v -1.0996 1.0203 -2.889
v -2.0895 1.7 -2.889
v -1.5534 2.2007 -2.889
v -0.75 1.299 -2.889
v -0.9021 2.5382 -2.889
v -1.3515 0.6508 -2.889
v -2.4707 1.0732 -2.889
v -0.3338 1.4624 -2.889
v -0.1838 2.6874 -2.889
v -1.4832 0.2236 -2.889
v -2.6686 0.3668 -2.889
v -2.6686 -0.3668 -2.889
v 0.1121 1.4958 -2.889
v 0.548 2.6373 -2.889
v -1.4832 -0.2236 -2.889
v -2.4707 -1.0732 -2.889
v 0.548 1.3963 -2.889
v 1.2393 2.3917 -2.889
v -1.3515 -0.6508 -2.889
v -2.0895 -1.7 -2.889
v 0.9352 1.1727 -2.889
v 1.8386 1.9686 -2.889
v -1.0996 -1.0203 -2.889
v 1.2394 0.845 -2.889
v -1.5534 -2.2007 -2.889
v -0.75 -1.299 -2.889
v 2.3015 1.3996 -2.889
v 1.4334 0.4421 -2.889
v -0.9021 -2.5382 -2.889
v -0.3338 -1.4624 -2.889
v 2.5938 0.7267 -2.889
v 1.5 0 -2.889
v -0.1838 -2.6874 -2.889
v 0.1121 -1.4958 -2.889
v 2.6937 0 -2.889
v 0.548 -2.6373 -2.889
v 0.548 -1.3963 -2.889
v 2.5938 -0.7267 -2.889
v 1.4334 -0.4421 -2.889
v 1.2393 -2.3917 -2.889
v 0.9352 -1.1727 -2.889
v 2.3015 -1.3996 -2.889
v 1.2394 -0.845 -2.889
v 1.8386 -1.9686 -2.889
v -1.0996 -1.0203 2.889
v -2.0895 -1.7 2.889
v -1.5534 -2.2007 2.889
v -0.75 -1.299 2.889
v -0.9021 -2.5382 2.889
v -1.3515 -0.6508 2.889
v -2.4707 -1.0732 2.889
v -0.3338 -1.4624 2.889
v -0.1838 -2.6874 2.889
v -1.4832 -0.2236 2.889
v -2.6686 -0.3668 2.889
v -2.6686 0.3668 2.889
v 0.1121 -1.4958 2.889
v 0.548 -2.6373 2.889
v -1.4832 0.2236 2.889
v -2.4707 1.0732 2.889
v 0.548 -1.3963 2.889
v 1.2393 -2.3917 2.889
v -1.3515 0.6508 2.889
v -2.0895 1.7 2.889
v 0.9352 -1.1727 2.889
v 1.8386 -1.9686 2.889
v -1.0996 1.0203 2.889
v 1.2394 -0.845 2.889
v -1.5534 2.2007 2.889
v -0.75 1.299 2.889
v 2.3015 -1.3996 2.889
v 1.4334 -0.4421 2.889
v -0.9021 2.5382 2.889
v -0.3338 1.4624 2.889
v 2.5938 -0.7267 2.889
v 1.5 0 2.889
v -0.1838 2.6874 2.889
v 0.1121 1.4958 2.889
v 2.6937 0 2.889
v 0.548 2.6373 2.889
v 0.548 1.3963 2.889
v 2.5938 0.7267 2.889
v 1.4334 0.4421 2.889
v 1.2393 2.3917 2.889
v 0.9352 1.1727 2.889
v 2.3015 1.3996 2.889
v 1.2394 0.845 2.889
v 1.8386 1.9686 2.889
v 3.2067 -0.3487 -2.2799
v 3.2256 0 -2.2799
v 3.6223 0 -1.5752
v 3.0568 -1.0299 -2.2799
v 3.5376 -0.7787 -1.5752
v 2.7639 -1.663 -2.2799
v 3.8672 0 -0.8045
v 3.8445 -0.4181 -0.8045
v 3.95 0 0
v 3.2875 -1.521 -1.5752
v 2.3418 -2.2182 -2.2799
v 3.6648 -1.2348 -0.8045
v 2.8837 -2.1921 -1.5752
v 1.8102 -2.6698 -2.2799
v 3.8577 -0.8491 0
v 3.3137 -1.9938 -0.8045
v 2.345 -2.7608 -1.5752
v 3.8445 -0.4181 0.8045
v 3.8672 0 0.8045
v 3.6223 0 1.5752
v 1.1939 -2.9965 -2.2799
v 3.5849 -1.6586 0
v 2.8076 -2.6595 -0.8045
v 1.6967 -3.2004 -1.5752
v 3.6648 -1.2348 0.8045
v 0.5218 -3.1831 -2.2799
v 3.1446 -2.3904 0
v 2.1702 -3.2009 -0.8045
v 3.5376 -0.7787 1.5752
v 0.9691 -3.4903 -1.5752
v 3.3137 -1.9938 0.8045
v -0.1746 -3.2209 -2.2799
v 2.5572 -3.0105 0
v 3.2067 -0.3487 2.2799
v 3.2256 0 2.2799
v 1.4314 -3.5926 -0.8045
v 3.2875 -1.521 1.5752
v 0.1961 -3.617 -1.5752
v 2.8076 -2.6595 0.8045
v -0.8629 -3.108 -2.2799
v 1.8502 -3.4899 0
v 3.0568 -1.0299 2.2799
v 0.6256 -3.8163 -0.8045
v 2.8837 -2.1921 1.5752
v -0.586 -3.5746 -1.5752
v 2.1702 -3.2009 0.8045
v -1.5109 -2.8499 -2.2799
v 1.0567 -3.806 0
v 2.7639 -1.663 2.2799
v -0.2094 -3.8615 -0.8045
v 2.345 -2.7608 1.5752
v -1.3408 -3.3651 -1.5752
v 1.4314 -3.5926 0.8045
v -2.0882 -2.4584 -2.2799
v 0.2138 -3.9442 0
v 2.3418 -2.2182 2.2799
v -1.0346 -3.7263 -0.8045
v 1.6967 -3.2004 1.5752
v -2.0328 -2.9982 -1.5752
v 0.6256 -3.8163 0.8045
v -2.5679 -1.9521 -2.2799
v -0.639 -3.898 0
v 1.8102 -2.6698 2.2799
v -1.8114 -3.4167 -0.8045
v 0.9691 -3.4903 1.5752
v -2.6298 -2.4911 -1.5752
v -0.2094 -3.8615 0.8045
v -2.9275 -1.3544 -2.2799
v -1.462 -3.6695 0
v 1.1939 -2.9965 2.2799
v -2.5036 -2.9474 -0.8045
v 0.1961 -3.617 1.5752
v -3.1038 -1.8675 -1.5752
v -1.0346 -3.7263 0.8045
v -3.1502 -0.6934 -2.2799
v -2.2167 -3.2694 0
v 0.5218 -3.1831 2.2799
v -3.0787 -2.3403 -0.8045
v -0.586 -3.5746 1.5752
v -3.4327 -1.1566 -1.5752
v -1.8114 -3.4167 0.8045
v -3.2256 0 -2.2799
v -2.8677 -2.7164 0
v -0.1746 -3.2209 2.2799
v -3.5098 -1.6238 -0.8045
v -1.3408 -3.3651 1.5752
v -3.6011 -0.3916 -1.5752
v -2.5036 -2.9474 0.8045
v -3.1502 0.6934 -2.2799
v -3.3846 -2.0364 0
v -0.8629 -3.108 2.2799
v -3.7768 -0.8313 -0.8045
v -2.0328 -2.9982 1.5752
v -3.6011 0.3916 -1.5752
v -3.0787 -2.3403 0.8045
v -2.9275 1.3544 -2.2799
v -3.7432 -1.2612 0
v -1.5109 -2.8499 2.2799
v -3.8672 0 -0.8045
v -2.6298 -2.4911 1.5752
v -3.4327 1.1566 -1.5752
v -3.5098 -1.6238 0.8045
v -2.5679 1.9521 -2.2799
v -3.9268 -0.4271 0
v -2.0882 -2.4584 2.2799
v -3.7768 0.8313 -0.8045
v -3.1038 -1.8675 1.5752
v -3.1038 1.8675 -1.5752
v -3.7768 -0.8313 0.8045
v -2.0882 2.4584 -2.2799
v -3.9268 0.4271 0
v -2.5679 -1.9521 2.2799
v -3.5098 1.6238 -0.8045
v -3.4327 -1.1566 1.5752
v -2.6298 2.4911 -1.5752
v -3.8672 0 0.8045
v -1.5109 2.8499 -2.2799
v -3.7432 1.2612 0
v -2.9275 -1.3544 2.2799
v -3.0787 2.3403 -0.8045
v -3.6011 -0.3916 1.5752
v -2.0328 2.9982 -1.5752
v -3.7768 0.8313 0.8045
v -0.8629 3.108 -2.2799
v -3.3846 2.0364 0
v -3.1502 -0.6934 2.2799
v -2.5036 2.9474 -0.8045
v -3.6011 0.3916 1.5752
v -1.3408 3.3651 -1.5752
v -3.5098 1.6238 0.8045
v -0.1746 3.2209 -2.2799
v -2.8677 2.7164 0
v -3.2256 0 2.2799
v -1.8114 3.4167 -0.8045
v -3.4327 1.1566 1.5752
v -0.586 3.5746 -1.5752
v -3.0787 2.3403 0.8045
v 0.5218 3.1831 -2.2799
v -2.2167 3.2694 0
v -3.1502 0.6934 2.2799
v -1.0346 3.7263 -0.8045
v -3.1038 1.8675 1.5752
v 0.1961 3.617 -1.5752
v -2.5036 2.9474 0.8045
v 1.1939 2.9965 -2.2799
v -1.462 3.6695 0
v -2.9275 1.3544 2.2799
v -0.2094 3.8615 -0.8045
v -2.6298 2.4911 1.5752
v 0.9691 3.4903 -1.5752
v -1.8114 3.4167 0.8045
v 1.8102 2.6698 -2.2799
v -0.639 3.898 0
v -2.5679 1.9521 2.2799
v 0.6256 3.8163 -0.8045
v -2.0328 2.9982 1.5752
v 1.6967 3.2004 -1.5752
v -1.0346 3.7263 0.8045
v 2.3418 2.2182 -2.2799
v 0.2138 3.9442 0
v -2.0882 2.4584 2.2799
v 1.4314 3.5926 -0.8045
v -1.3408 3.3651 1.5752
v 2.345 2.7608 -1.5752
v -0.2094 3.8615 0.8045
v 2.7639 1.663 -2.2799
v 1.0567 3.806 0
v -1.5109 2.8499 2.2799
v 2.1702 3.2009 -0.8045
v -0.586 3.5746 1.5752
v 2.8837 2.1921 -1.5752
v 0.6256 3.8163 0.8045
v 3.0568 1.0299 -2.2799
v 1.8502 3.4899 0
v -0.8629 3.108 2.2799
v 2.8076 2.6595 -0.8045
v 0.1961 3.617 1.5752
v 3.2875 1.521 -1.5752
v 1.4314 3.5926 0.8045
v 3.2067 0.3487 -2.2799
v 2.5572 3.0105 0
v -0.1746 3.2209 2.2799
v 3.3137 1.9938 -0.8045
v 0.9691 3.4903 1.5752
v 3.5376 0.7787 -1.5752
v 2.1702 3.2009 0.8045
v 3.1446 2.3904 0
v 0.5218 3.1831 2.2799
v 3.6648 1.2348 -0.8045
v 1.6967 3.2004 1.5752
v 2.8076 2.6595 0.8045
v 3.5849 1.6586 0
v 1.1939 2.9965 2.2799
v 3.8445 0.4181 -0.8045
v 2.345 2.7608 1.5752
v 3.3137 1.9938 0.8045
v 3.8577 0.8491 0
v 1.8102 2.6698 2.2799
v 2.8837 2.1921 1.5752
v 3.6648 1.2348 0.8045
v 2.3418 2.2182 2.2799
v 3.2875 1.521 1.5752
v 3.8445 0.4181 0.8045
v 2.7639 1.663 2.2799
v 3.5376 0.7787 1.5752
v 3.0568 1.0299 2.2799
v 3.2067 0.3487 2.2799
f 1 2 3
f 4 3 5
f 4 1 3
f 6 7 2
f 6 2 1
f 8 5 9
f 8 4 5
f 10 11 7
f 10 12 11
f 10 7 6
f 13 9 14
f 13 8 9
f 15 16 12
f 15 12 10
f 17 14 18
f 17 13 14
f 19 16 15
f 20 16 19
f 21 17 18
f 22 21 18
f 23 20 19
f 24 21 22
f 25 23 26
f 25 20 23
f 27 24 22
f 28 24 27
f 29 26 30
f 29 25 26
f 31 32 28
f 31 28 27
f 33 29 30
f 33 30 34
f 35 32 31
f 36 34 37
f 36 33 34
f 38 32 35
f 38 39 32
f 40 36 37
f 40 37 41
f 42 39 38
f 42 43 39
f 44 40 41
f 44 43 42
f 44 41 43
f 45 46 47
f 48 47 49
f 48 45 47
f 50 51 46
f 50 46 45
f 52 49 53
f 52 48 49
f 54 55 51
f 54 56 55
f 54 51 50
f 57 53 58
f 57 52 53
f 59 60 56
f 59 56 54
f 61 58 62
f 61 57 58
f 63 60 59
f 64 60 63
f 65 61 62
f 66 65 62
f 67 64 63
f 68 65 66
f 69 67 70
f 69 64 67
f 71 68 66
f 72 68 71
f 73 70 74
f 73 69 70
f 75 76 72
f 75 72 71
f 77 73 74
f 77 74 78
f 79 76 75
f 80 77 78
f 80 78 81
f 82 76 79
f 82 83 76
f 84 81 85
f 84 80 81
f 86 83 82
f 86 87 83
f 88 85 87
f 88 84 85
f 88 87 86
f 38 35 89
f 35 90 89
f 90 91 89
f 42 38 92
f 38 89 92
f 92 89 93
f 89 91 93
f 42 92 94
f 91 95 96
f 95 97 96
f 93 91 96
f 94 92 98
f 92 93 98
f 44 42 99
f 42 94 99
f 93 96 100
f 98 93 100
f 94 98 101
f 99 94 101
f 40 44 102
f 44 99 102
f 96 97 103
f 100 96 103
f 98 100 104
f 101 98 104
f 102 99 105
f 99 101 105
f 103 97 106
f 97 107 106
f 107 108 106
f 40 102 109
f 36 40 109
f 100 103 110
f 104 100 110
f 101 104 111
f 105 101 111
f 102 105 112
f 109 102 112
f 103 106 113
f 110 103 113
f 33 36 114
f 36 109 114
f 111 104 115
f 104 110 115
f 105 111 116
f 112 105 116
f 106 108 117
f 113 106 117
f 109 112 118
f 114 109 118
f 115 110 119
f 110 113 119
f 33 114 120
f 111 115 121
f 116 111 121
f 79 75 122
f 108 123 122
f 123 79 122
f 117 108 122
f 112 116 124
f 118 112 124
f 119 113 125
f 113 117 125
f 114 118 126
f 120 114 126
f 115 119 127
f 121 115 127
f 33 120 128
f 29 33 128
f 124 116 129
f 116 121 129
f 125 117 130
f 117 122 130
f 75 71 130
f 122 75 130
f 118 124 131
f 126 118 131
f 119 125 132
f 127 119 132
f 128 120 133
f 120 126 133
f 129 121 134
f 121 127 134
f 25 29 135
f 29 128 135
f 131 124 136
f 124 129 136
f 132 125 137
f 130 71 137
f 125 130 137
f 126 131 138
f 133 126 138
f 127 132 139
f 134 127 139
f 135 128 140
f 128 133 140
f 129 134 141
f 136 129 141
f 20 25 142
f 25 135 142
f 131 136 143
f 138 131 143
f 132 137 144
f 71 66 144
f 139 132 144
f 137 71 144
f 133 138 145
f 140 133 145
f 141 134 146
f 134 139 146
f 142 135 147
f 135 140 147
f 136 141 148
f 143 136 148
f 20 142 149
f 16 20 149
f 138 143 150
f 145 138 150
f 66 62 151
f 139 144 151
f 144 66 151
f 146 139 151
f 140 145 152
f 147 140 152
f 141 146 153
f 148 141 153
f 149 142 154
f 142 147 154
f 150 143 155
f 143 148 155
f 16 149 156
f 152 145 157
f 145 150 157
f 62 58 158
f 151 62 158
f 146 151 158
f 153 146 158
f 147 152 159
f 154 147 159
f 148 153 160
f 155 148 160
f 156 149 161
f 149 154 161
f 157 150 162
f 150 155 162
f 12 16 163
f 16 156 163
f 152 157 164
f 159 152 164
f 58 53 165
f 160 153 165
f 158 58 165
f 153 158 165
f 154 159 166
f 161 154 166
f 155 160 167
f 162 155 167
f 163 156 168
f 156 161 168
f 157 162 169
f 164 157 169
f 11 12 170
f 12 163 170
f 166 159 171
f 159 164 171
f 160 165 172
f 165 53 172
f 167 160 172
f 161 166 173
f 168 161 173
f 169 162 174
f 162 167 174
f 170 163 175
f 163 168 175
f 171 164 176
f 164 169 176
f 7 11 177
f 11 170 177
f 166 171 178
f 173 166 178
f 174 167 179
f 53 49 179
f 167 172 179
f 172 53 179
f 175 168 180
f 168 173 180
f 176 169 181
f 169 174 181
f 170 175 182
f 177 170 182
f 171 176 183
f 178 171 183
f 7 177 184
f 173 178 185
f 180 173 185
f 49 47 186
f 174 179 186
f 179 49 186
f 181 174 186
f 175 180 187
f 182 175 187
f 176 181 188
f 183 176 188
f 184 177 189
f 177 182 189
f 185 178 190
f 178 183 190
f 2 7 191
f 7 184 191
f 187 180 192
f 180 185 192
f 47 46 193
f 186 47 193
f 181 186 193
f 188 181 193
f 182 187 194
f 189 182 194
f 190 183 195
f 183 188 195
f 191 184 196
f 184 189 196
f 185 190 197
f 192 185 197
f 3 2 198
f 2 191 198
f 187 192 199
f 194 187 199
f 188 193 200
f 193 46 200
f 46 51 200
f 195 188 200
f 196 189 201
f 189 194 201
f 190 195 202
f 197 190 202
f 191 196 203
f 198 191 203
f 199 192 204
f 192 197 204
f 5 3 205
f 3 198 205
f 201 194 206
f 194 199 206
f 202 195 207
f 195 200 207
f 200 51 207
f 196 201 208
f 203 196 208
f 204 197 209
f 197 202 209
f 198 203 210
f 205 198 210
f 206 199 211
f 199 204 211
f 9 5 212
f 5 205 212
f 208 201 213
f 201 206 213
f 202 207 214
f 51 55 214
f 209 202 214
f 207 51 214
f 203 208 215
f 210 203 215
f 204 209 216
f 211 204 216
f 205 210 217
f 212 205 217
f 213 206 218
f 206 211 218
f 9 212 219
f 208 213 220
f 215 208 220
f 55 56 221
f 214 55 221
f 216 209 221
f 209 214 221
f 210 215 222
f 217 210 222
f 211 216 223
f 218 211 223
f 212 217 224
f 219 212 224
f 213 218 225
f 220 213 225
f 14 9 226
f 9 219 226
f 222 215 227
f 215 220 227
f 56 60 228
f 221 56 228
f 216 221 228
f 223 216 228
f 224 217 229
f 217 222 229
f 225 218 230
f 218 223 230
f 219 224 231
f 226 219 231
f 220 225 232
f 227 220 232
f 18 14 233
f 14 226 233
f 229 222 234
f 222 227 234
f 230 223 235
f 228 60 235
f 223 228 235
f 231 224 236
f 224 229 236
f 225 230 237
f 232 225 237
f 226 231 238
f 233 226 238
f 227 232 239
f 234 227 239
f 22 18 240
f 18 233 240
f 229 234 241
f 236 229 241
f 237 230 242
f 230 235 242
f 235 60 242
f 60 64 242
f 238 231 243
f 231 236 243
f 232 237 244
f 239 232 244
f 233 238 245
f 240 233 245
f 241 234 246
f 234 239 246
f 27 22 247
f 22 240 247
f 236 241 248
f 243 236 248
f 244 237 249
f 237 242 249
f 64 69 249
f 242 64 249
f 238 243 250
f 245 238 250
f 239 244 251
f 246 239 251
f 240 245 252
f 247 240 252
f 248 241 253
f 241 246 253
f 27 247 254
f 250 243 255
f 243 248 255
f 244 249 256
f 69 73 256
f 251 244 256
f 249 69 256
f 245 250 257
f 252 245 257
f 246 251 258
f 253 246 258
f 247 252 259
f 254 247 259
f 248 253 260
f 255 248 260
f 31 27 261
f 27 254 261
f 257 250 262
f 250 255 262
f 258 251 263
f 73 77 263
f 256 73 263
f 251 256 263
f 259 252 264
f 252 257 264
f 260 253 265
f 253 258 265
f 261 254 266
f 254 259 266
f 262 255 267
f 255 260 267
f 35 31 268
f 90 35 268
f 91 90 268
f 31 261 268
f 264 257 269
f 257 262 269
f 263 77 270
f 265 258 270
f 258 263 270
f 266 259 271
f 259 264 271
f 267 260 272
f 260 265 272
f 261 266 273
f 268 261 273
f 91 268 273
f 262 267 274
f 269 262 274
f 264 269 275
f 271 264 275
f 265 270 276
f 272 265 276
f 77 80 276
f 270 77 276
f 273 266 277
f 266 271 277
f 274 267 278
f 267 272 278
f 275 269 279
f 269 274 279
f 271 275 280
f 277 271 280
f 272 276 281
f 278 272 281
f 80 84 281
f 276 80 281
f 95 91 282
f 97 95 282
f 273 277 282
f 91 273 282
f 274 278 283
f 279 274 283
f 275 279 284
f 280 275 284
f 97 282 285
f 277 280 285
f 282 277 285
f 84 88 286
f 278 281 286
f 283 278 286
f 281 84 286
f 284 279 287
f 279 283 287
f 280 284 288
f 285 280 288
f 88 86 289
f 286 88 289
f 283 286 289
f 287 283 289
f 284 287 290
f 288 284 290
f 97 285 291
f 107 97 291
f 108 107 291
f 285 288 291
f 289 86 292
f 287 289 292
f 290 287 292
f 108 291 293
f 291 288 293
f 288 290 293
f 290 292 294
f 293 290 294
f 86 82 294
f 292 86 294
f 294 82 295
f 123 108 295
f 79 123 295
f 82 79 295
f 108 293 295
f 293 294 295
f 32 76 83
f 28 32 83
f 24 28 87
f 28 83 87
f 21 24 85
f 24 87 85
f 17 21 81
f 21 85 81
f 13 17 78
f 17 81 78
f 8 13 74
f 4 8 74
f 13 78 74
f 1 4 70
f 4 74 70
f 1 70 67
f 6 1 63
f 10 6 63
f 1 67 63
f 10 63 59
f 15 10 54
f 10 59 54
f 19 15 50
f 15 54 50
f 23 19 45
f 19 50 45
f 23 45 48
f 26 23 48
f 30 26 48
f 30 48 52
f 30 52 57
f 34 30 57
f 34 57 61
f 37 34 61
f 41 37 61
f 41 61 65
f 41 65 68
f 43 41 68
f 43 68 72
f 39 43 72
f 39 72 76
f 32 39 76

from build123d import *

# Parameters (mm, degrees)
SKETCH2_W               = 7.9
SKETCH2_H               = 1.060956176
CUT_EXTRUDE1_DEPTH      = 4.95
CUT_EXTRUDE1_DEPTH_BACK = 4.95
SKETCH3_R               = 1.5
CUT_EXTRUDE2_DEPTH      = 6.778087647


with BuildPart() as part:
    # Sketch1 → Revolve4 (revolve)
    with BuildSketch(Plane(origin=(0, 0, 0), x_dir=(1, 0, 0), z_dir=(0, 1, 0))):
        with BuildLine():
            Line((0, -3.95), (0, 3.95))
            ThreePointArc((0, 3.95), (3.95, 0), (0, -3.95))
        make_face()
    revolve(axis=Axis((0, 0, 3.95), (0, 0, -1)))

    # Sketch2 → Cut-Extrude1 (cut, two sides)
    with BuildSketch(Plane(origin=(0, 0, 0), x_dir=(1, 0, 0), z_dir=(0, 1, 0))) as cut_extrude1_sk:
        with Locations((0, -3.419521912)):
            Rectangle(SKETCH2_W, SKETCH2_H)
        with Locations((0, 3.419521912)):
            Rectangle(SKETCH2_W, SKETCH2_H)
    extrude(amount=CUT_EXTRUDE1_DEPTH, mode=Mode.SUBTRACT)
    extrude(cut_extrude1_sk.sketch, amount=-CUT_EXTRUDE1_DEPTH_BACK, mode=Mode.SUBTRACT)

    # Sketch3 → Cut-Extrude2 (cut, through all)
    with BuildSketch(Plane.XY.offset(2.889043824)):
        Circle(SKETCH3_R)
    extrude(amount=-CUT_EXTRUDE2_DEPTH, mode=Mode.SUBTRACT)


solid = part.part
